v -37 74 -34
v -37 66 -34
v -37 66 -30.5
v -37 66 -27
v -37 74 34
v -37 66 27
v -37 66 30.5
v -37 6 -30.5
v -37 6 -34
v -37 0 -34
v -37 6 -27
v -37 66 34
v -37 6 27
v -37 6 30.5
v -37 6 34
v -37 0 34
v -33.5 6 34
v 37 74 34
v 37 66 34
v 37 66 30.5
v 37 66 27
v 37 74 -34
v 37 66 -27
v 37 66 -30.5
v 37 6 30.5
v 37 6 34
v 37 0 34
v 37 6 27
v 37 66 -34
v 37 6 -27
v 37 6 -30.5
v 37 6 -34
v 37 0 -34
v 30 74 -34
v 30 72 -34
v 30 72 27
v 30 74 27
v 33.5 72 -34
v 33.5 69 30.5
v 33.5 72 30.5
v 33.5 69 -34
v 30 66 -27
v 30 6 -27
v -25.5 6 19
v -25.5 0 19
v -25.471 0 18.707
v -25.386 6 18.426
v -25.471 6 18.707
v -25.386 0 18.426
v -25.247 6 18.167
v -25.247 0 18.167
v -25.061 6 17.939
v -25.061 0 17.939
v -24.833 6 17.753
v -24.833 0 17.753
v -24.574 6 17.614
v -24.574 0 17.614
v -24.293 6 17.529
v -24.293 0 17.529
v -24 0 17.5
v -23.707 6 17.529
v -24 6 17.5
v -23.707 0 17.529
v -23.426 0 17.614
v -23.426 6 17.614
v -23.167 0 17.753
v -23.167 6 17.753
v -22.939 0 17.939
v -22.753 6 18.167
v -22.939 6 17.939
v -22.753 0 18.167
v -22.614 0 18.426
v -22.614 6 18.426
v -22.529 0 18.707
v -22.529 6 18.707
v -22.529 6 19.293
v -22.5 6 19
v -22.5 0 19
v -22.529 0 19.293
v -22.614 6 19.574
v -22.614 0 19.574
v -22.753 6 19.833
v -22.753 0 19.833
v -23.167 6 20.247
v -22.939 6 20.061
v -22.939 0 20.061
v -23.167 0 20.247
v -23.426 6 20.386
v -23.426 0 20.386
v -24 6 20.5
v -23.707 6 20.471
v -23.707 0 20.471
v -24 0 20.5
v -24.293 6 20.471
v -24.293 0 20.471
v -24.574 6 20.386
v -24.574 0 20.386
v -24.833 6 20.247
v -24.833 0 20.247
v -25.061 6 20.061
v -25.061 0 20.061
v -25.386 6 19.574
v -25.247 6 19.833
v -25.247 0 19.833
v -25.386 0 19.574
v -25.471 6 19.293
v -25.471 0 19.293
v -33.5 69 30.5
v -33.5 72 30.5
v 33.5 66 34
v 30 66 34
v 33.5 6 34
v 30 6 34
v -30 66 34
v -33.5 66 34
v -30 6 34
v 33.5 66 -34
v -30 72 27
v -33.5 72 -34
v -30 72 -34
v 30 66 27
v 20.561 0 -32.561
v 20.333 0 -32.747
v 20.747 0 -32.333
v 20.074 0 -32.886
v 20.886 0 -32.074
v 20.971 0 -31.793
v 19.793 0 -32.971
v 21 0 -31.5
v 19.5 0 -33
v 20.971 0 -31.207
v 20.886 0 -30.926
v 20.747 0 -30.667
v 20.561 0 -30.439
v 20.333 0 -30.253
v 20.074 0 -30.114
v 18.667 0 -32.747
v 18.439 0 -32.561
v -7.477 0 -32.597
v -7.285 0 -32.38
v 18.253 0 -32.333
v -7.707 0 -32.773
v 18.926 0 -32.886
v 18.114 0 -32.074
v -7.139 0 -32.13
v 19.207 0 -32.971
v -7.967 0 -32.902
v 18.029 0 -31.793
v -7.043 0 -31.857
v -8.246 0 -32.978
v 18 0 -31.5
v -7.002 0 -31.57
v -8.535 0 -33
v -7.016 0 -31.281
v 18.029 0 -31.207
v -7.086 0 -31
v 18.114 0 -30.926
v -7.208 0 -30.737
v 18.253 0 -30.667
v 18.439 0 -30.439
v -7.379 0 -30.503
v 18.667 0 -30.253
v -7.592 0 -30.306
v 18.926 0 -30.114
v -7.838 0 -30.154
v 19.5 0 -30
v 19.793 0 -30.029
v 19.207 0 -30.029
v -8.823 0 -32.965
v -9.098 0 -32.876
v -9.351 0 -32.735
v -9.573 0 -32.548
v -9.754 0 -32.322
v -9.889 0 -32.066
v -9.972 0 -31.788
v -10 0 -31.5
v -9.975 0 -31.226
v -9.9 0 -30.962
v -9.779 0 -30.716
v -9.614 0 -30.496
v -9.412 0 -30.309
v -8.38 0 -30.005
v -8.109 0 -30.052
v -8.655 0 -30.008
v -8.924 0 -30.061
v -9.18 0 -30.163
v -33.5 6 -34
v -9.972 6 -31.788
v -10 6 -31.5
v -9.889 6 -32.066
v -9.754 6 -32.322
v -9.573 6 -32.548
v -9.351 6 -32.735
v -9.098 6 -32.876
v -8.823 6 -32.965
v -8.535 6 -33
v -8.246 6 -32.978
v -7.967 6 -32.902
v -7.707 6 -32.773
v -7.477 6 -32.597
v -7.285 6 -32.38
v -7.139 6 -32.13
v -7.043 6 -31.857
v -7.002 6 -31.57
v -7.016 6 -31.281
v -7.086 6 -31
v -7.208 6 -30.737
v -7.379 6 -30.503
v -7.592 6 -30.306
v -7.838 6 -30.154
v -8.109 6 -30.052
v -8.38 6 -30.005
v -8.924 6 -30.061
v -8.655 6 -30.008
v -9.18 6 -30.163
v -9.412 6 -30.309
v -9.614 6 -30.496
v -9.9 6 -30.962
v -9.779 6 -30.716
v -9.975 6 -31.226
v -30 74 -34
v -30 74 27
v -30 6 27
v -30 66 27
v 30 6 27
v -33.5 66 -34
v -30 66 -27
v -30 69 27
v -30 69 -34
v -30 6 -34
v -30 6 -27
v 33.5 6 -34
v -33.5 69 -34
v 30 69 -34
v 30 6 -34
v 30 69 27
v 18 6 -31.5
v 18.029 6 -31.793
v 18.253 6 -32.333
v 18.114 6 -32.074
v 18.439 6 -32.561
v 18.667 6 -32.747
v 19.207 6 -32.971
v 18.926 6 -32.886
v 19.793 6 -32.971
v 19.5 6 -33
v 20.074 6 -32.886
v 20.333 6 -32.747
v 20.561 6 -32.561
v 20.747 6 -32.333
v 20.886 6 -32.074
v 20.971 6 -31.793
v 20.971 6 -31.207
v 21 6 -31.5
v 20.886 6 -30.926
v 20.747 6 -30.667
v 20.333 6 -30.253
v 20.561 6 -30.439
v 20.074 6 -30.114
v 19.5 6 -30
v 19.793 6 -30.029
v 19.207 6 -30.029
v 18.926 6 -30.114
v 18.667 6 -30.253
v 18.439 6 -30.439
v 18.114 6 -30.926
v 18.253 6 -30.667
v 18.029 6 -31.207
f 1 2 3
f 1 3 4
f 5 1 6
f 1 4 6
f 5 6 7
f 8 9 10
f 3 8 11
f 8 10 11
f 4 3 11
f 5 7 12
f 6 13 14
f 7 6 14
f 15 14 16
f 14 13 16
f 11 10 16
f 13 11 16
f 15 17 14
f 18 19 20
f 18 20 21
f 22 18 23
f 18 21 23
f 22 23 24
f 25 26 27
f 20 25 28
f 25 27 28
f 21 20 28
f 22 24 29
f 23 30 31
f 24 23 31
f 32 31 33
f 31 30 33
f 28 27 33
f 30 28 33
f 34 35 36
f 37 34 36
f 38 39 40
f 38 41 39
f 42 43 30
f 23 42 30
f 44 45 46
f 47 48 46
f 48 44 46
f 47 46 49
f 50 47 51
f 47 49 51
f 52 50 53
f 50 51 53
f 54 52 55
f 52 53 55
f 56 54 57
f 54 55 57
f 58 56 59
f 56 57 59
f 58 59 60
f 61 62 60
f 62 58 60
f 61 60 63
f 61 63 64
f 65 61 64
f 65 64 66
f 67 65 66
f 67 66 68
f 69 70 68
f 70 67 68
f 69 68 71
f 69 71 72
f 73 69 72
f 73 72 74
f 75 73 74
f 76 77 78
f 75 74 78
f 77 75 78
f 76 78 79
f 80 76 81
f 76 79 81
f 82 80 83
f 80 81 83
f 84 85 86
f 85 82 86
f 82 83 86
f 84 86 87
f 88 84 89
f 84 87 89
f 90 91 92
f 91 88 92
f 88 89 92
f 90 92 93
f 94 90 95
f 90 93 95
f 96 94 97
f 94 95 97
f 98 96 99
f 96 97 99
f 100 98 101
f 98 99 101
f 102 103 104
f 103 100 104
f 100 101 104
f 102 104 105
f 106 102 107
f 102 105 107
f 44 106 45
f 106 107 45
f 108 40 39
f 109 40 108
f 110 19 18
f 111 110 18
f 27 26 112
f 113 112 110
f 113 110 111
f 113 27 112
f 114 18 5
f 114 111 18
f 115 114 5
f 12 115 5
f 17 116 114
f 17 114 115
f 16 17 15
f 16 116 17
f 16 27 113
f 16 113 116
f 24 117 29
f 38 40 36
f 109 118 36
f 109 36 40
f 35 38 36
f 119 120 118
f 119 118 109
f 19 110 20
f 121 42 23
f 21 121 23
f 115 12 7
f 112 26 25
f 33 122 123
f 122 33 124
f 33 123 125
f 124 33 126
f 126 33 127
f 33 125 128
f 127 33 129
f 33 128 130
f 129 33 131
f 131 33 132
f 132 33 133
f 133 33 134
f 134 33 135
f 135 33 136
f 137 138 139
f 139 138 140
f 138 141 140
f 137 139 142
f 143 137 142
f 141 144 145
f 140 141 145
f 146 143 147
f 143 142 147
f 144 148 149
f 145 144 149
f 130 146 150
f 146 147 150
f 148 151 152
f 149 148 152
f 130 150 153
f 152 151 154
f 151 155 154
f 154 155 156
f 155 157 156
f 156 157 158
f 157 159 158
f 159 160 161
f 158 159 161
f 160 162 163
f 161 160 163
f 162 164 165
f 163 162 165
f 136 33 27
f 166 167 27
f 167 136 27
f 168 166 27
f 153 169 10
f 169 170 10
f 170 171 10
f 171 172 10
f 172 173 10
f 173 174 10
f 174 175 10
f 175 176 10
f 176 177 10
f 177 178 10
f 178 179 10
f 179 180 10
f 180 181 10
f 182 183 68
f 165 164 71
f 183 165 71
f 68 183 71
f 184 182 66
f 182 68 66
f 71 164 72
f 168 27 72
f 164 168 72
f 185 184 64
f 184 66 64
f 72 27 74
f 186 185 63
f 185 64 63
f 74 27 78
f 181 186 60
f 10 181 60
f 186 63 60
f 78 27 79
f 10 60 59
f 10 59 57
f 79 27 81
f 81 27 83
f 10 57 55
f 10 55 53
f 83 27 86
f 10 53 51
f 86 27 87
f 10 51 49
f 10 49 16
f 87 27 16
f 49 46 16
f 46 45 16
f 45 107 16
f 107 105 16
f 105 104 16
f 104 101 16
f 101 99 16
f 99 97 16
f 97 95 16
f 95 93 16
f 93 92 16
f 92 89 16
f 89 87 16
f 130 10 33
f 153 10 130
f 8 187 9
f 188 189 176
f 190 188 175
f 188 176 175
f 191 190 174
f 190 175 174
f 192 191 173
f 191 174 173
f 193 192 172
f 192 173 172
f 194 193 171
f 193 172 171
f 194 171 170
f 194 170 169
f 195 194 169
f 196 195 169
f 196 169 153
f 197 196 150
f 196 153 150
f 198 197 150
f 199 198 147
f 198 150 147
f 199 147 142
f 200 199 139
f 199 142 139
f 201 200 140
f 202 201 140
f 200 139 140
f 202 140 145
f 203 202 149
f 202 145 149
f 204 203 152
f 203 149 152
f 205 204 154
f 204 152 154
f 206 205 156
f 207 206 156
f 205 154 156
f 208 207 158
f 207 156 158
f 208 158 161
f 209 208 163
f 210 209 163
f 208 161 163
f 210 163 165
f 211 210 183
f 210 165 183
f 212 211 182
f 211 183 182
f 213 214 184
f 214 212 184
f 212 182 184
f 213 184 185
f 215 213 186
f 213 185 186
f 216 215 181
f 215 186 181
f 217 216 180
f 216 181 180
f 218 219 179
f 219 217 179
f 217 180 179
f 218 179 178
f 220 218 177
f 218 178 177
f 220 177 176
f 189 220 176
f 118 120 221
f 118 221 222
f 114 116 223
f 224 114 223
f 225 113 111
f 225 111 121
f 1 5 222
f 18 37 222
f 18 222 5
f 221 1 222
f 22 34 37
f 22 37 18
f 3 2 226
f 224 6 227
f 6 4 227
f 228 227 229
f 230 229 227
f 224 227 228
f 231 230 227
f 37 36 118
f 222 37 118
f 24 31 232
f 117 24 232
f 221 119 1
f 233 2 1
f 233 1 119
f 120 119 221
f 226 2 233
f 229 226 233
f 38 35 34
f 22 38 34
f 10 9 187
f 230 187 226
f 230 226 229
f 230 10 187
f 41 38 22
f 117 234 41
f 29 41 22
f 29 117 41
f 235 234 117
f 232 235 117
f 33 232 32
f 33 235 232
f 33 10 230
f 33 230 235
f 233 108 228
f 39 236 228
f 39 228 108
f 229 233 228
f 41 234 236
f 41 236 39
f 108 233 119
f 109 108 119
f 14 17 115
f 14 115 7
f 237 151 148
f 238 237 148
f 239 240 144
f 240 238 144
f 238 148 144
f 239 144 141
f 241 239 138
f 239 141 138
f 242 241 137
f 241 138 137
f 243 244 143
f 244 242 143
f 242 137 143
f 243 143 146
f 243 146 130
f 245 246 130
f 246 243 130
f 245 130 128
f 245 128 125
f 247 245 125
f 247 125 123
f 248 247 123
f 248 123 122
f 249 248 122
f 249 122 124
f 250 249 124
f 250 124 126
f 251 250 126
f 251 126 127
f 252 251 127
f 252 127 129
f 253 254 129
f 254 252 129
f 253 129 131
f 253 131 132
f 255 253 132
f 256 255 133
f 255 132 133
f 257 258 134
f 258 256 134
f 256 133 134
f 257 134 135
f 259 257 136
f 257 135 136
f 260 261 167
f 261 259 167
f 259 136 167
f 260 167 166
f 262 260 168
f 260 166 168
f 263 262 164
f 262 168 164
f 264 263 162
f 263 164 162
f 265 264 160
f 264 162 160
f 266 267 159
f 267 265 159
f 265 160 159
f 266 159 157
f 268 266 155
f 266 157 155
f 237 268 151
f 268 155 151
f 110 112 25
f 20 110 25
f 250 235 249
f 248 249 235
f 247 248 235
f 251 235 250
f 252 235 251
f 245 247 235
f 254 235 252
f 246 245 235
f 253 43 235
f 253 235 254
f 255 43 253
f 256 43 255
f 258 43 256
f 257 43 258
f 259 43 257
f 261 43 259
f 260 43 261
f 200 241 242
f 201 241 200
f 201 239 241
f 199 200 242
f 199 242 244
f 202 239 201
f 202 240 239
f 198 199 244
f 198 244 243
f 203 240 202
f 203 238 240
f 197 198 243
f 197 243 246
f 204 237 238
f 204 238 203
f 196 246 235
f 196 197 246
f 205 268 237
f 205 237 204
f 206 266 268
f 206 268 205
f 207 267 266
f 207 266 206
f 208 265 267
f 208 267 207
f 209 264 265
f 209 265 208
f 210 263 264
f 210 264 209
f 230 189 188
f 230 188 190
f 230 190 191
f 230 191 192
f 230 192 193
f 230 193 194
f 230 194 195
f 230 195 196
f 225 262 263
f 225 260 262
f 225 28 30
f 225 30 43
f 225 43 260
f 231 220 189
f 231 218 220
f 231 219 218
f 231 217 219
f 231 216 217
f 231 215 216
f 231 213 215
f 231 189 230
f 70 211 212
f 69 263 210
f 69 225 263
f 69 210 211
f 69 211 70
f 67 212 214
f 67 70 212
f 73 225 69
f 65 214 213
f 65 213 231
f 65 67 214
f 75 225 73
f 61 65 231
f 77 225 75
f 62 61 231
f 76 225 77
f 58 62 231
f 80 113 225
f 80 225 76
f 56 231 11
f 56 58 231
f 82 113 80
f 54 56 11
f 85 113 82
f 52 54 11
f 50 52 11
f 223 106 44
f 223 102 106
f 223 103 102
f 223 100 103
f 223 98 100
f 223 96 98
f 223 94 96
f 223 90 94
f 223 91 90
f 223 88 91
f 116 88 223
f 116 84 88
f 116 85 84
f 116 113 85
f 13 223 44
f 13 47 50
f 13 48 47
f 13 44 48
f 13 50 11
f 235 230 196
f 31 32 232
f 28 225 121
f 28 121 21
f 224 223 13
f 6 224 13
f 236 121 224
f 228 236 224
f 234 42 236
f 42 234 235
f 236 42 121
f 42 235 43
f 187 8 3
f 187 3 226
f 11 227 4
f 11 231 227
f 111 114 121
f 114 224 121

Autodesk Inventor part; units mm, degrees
ref_plane "YZ Plane" through (0, 0, 0) normal (1, 0, 0) x (0, 1, 0)
ref_plane "XZ Plane" through (0, 0, 0) normal (0, 1, 0) x (-1, 0, 0)
ref_plane "XY Plane" through (0, 0, 0) normal (0, 0, 1) x (1, 0, 0)
sketch "Sketch1" plane through (0, 0, 0) normal (0, 1, 0) x (-1, 0, 0)
  line L0 (-30, 34) -> (30, 34)
  line L1 (30, 34) -> (30, -34)
  line L2 (30, -34) -> (-30, -34)
  line L3 (-30, -34) -> (-30, 34)
  line L4 (-30, 34) -> (30, -34) construction
  line L5 (30, 34) -> (-30, -34) construction
  line L6 (30, 34) -> (30, 19)
  line L7 (-30, -34) -> (-23, -34)
  line L8 (-30, -34) -> (8.5, -34)
  circle A0 centre (8.5, -31.5) radius 1.5
  circle A1 centre (-19.5, -31.5) radius 1.5
  circle A2 centre (-19.5, -31.5) radius 1.5
  circle A3 centre (24, 19) radius 1.5
  line L9 (24, 19) -> (0, 19)
  line L10 (0, 19) -> (0, 0)
  line L11 (0, 0) -> (8.5, -31.5)
  line L12 (8.5, -31.5) -> (0, -31.5)
  line L13 (-19.5, -31.5) -> (-19.5, 0)
  line L14 (-19.5, 0) -> (0, 0)
  line L15 (30, 34) -> (37, 34)
  line L16 (-37, -34) -> (37, -34)
  line L17 (37, -34) -> (37, 34)
  line L18 (37, 34) -> (-37, 34)
  line L19 (-37, 34) -> (-37, -34)
  line L20 (-37, -34) -> (37, 34) construction
  line L21 (37, -34) -> (-37, 34) construction
  dimension "d0" = 60
  dimension "d1" = 68
  dimension "d3" = 7
  dimension "d5" = 3
  dimension "d6" = 3
  dimension "d7" = 3
  dimension "d10" = 7
  dimension "d11" = 31.5
  dimension "d12" = 19.5
  dimension "d13" = 90
  dimension "d14" = 32.6267
  dimension "d15" = 8.5
  dimension "d16" = 24
extrude "Extrusion1" add sketch "Sketch1" along normal blind 6
sketch "Sketch2" plane through (0, 6, 0) normal (0, 1, 0) x (1, 0, 0)
  circle A0 centre (-24, -19) radius 1.5 projected
  circle A1 centre (19.5, 31.5) radius 1.5 projected
  circle A2 centre (-8.5, 31.5) radius 1.5 projected
  line L0 (37, 34) -> (-37, 34) projected
  line L1 (-37, 34) -> (-37, -34) projected
  line L2 (-37, -34) -> (37, -34) projected
  line L3 (37, -34) -> (37, 34) projected
  line L4 (-37, 34) -> (-37, -34) projected
  line L5 (-33.5, 34) -> (-30, 34)
  line L6 (-30, 34) -> (-30, 27)
  line L7 (-30, 27) -> (-37, 27)
  line L8 (-37, 27) -> (-37, 30.5)
  line L9 (-37, 30.5) -> (-33.5, 34)
  line L10 (37, 34) -> (-37, 34) projected
  line L11 (-37, -34) -> (-30, -34)
  line L12 (-30, -34) -> (-30, -27)
  line L13 (-30, -27) -> (-37, -27)
  line L14 (-37, -27) -> (-37, -30.5)
  line L15 (-37, -34) -> (37, -34) projected
  line L16 (33.5, -34) -> (30, -34)
  line L17 (30, -34) -> (30, -27)
  line L18 (30, -27) -> (37, -27)
  line L19 (37, -27) -> (37, -30.5)
  line L20 (33.5, 34) -> (30, 34)
  line L21 (30, 34) -> (30, 27)
  line L22 (30, 27) -> (37, 27)
  line L23 (37, 27) -> (37, 30.5)
  line L24 (-30, -34) -> (-33.5, -34)
  line L25 (-33.5, -34) -> (-37, -30.5)
  line L26 (-37, -30.5) -> (-37, -27)
  line L27 (33.5, -34) -> (37, -30.5)
  line L28 (37, -34) -> (37, 34) projected
  line L29 (37, -30.5) -> (37, -27)
  line L30 (33.5, -34) -> (30, -34)
  line L31 (37, 27) -> (37, 30.5)
  line L32 (37, 30.5) -> (33.5, 34)
  line L33 (33.5, 34) -> (30, 34)
  point P0 (0, 0)
  dimension "d19" = 7
  dimension "d20" = 7
  dimension "d21" = 7
  dimension "d22" = 7
  dimension "d23" = 7
  dimension "d24" = 7
  dimension "d25" = 7
  dimension "d26" = 7
  dimension "d27" = 3.5
extrude "Extrusion2" add sketch "Sketch2" along normal blind 60 contours L32 L3 L22 L21 L0 | L6 L7 L1 L9 L0 | L3 L27 L2 L17 L18 | L13 L12 L2 L25 L1
sketch "Sketch3" plane through (0, 66, 0) normal (0, 1, 0) x (1, 0, 0)
  line L0 (37, 30.5) -> (33.5, 34) projected
  line L1 (33.5, 34) -> (30, 34) projected
  line L2 (30, 34) -> (30, 27) projected
  line L3 (30, 27) -> (37, 27) projected
  line L4 (37, 27) -> (37, 30.5) projected
  line L5 (37, -30.5) -> (37, -27) projected
  line L6 (37, -27) -> (30, -27) projected
  line L7 (30, -27) -> (30, -34) projected
  line L8 (30, -34) -> (33.5, -34) projected
  line L9 (33.5, -34) -> (37, -30.5) projected
  line L10 (-30, -34) -> (-30, -27) projected
  line L11 (-30, -27) -> (-37, -27) projected
  line L12 (-37, -27) -> (-37, -30.5) projected
  line L13 (-37, -30.5) -> (-33.5, -34) projected
  line L14 (-33.5, -34) -> (-30, -34) projected
  line L15 (-30, 27) -> (-30, 34) projected
  line L16 (-33.5, 34) -> (-37, 30.5) projected
  line L17 (-37, 30.5) -> (-37, 27) projected
  line L18 (-37, 27) -> (-30, 27) projected
  line L19 (-30, 27) -> (-30, 34) projected
  line L20 (-30, 34) -> (-33.5, 34) projected
  line L21 (-37, 34) -> (-30, 34)
  line L22 (-30, 34) -> (-30, -34)
  line L23 (-30, -34) -> (-37, -34)
  line L24 (-37, -34) -> (-37, 34)
  line L25 (30, 34) -> (30, 27) projected
  line L26 (37, -34) -> (30, -34)
  line L27 (30, -34) -> (30, 34)
  line L28 (30, 34) -> (37, 34)
  line L29 (37, 34) -> (37, -34)
  line L30 (-30, -34) -> (-30, -27) projected
  line L31 (37, -27) -> (30, -27) projected
  line L32 (-30, -34) -> (30, -34)
  line L33 (30, -34) -> (30, -27)
  line L34 (30, -27) -> (-30, -27)
  line L35 (-30, -27) -> (-30, -34)
  point P0 (0, 0)
extrude "Extrusion3" add sketch "Sketch3" along normal blind 8
sketch "Sketch4" plane through (37, 0, -34) normal (0, 0, -1) x (-1, 0, 0)
  line L0 (0, 66) -> (0, 74) projected
  line L1 (0, 74) -> (7, 74)
  line L2 (7, 74) -> (7, 66)
  line L3 (7, 66) -> (0, 66)
  line L4 (0, 66) -> (0, 74)
  line L5 (74, 6) -> (74, 66) projected
  line L6 (74, 66) -> (67, 66)
  line L7 (67, 66) -> (67, 74)
  line L8 (67, 74) -> (74, 74)
  line L9 (74, 74) -> (74, 66)
  line L10 (7, 66) -> (7, 69)
  line L11 (7, 66) -> (7, 74) projected
  line L12 (7, 69) -> (3.5, 69)
  line L13 (3.5, 69) -> (3.5, 72)
  line L14 (3.5, 72) -> (7, 72)
  line L15 (7, 72) -> (7, 74)
  line L16 (3.5, 72) -> (7, 72)
  line L17 (7, 72) -> (7, 69)
  line L18 (7, 69) -> (3.5, 69)
  line L19 (3.5, 69) -> (3.5, 72)
  line L20 (67, 6) -> (67, 66) projected
  line L21 (67, 66) -> (67, 69)
  line L22 (67, 66) -> (67, 74) projected
  line L23 (67, 69) -> (70.5, 69)
  line L24 (70.5, 69) -> (70.5, 72)
  line L25 (70.5, 72) -> (67, 72)
  line L26 (67, 72) -> (67, 69)
  line L27 (7, 72) -> (67, 72)
  line L28 (67, 72) -> (67, 69)
  line L29 (67, 69) -> (7, 69)
  line L30 (7, 69) -> (7, 72)
  point P0 (37, 0)
  dimension "d32" = 3
  dimension "d33" = 3
  dimension "d34" = 3
  dimension "d35" = 3.5
  dimension "d36" = 3
extrude "Extrusion4" cut sketch "Sketch4" against normal blind 64.5 contours L12 L13 L14 L2 | L2 L27 L7 L29 | L7 L25 L24 L23
sketch "Sketch5" plane through (37, 0, 34) normal (1, 0, 0) x (0, 0, -1)
  line L0 (0, 0) -> (0, 6) projected
  line L1 (0, 0) -> (5.1764, -19.3185)
  line L2 (0, 0) -> (20, 0) construction
  line L3 (5.1764, -19.3185) -> (25.1764, -19.3185)
  line L4 (5.1764, -19.3185) -> (25.1764, -19.3185) construction
  line L5 (25.1764, -19.3185) -> (34, 0)
  line L6 (29.3317, -3) -> (23.2485, -16.3185)
  line L7 (23.2485, -16.3185) -> (7.4784, -16.3185)
  line L8 (7.4784, -16.3185) -> (3.9097, -3)
  line L9 (3.9097, -3) -> (20, -3)
  line L10 (20, -3) -> (29.3317, -3)
  dimension "d39" = 20
  dimension "d40" = 75
  dimension "d41" = 20
  dimension "d42" = 0
  dimension "d43" = 3
sketch "Sketch6" plane through (37, 0, 34) normal (1, 0, 0) x (0, 0, -1)
  line L0 (68, 0) -> (68, 6) projected
  line L1 (68, 0) -> (28, 0)
  line L2 (28, 0) -> (28, -13)
  line L3 (28, -13) -> (68, -13)
  line L4 (66, -11) -> (30, -11)
  line L5 (30, -11) -> (30, -2)
  line L6 (30, -2) -> (66, -2)
  line L7 (68, -13) -> (68, -11)
  line L8 (68, -2) -> (68, 0)
  line L9 (66, -11) -> (68, -11)
  line L10 (66, -2) -> (68, -2)
  point P0 (34, 0)
  dimension "d44" = 40
  dimension "d45" = 13
  dimension "d46" = 2
properties part number "Main_Body_Wheel"
